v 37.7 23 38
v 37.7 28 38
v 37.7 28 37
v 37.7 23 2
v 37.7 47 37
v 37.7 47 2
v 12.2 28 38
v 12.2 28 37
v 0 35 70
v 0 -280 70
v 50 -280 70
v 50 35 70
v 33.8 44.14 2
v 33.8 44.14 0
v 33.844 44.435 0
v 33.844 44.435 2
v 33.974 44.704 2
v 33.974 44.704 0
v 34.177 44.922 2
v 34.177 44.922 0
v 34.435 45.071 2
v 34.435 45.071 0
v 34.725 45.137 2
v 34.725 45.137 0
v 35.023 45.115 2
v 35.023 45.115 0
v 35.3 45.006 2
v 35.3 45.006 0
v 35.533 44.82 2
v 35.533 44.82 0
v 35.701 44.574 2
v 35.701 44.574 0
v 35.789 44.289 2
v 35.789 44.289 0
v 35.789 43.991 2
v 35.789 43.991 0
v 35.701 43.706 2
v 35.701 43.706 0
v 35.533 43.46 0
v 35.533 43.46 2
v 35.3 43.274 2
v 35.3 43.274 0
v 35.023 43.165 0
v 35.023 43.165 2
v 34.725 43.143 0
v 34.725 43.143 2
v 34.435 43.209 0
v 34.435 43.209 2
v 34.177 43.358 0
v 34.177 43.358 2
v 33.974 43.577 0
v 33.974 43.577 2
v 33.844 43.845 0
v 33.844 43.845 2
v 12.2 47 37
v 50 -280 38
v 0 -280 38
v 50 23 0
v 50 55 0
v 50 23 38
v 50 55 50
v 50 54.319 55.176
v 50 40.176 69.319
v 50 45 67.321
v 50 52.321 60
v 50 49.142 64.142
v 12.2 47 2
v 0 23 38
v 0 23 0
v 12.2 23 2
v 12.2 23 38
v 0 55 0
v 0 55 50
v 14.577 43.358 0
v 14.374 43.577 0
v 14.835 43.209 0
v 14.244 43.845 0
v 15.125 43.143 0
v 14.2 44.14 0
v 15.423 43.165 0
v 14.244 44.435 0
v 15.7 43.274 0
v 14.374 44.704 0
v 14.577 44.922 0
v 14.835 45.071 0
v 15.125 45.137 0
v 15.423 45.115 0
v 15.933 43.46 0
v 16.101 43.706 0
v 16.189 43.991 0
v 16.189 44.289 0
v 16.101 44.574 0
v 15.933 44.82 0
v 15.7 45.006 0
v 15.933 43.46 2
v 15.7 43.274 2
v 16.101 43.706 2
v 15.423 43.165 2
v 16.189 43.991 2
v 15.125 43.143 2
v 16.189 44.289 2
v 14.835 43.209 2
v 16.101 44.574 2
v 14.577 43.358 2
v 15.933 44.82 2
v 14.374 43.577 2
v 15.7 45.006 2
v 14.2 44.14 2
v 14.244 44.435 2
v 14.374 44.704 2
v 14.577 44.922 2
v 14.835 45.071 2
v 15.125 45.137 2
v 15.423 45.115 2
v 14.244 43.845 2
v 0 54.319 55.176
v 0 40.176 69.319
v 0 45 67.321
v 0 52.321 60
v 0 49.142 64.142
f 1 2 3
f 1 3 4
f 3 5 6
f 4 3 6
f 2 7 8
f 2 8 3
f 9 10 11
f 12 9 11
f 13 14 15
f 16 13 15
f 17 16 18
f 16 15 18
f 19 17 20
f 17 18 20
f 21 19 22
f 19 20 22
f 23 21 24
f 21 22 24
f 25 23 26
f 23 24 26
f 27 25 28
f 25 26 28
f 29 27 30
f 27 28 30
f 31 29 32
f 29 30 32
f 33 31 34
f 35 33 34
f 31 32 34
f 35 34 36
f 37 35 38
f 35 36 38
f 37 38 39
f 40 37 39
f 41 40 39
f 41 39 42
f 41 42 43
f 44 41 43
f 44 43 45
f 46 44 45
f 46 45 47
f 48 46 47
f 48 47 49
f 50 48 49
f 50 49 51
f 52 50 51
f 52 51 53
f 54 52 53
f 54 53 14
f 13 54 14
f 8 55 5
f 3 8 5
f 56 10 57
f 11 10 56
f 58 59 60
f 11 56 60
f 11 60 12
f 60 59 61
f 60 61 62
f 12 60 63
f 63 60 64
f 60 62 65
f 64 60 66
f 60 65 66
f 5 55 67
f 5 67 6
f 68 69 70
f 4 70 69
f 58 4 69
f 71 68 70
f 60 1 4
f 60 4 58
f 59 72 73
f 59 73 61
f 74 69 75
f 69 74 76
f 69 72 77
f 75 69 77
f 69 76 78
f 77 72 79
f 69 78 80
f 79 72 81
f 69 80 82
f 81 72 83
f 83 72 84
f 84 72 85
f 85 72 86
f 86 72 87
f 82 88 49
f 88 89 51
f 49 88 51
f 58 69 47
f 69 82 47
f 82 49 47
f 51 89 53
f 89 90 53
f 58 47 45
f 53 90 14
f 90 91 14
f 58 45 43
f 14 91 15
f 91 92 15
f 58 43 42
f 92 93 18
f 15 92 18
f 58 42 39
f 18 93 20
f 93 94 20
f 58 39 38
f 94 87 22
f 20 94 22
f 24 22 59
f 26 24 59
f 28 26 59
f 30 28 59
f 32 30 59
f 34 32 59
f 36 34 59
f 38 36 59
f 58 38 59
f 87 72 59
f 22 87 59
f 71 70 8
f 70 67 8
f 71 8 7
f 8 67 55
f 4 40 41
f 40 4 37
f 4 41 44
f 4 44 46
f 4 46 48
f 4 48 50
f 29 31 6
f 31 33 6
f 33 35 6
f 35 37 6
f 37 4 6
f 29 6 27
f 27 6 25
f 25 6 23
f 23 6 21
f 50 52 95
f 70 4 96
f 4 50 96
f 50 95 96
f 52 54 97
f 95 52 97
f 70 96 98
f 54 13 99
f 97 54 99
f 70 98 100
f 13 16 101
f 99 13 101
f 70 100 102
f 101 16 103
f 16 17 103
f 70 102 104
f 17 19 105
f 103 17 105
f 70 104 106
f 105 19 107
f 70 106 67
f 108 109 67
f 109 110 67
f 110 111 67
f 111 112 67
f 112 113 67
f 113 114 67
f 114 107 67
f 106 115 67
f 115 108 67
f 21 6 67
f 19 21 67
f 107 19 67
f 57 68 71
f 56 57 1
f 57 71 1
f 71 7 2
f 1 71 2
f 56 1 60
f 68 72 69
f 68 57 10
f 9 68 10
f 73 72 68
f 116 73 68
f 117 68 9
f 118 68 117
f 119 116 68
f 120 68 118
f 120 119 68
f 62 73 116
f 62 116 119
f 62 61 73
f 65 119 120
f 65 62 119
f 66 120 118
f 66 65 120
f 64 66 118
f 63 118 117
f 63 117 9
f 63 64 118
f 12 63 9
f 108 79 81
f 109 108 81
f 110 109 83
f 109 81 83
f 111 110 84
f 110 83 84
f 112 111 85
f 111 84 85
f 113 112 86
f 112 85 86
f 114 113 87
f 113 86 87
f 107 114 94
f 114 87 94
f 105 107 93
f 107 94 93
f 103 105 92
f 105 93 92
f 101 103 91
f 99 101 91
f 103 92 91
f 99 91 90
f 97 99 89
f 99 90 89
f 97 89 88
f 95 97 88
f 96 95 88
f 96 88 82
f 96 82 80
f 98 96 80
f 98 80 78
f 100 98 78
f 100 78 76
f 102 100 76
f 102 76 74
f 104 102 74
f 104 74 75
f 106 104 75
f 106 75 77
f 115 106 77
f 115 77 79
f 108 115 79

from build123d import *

# Parameters (mm, degrees)
SKETCH_1_W          = 50
SKETCH_1_H          = 55
EXTRUDE_1_DEPTH     = 70
SKETCH_3_W          = 50
SKETCH_3_H          = 25
CUT_EXTRUDE_1_DEPTH = 38
SKETCH_4_W          = 25.5
SKETCH_4_H          = 36
CUT_EXTRUDE_2_DEPTH = 22
SKETCH_12_W         = 25.5
SKETCH_12_H         = 1
EXTRUDE_2_DEPTH     = 19
EXTRUDE_3_DEPTH     = 2
SKETCH_16_W         = 50
SKETCH_16_H         = 32
EXTRUDE_5_DEPTH     = 280
FILLET_1_R          = 20
SKETCH_23_R         = 1
CUT_EXTRUDE_3_DEPTH = 10


with BuildPart() as part:
    # 草图1 → 凸台-拉伸1 (new body)
    with BuildSketch(Plane.XY):
        with Locations((25, 27.5)):
            Rectangle(SKETCH_1_W, SKETCH_1_H)
    extrude(amount=EXTRUDE_1_DEPTH)

    # 草图3 → 切除-拉伸1 (cut)
    with BuildSketch(Plane(origin=(0, 0, 0), x_dir=(-1, 0, 0), z_dir=(0, 0, -1))):
        with Locations((-25, 12.5)):
            Rectangle(SKETCH_3_W, SKETCH_3_H)
    extrude(amount=-CUT_EXTRUDE_1_DEPTH, mode=Mode.SUBTRACT)

    # 草图4 → 切除-拉伸2 (cut)
    with BuildSketch(Plane.XZ.offset(-25)):
        with Locations((24.95, 20)):
            Rectangle(SKETCH_4_W, SKETCH_4_H)
    extrude(amount=-CUT_EXTRUDE_2_DEPTH, mode=Mode.SUBTRACT)

    # 草图12 → 凸台-拉伸2 (add)
    with BuildSketch(Plane.XZ.offset(-47)):
        with Locations((24.95, 37.5)):
            Rectangle(SKETCH_12_W, SKETCH_12_H)
    extrude(amount=EXTRUDE_2_DEPTH)

    # 草图13 → 凸台-拉伸3 (add)
    with BuildSketch(Plane.XZ.offset(-25)):
        Polygon((12.2, 38), (0, 38), (0, 0), (50, 0), (50, 38), (37.7, 38), (37.7, 2), (12.2, 2), align=None)
    extrude(amount=EXTRUDE_3_DEPTH)

    # 草图16 → 凸台-拉伸5 (add)
    with BuildSketch(Plane.XZ):
        with Locations((25, 54)):
            Rectangle(SKETCH_16_W, SKETCH_16_H)
    extrude(amount=EXTRUDE_5_DEPTH)

    # 圆角1
    fillet_1_edges = [part.edges().sort_by_distance(p)[0] for p in [
        (25, 55, 70),
    ]]
    fillet(fillet_1_edges, radius=FILLET_1_R)

    # 草图23 → 切除-拉伸3 (cut)
    with BuildSketch(Plane(origin=(0, 0, 0), x_dir=(-1, 0, 0), z_dir=(0, 0, -1))):
        with Locations((-15.2, 44.140200043)):
            Circle(SKETCH_23_R)
        with Locations((-34.8, 44.140200043)):
            Circle(SKETCH_23_R)
    extrude(amount=-CUT_EXTRUDE_3_DEPTH, mode=Mode.SUBTRACT)


solid = part.part
